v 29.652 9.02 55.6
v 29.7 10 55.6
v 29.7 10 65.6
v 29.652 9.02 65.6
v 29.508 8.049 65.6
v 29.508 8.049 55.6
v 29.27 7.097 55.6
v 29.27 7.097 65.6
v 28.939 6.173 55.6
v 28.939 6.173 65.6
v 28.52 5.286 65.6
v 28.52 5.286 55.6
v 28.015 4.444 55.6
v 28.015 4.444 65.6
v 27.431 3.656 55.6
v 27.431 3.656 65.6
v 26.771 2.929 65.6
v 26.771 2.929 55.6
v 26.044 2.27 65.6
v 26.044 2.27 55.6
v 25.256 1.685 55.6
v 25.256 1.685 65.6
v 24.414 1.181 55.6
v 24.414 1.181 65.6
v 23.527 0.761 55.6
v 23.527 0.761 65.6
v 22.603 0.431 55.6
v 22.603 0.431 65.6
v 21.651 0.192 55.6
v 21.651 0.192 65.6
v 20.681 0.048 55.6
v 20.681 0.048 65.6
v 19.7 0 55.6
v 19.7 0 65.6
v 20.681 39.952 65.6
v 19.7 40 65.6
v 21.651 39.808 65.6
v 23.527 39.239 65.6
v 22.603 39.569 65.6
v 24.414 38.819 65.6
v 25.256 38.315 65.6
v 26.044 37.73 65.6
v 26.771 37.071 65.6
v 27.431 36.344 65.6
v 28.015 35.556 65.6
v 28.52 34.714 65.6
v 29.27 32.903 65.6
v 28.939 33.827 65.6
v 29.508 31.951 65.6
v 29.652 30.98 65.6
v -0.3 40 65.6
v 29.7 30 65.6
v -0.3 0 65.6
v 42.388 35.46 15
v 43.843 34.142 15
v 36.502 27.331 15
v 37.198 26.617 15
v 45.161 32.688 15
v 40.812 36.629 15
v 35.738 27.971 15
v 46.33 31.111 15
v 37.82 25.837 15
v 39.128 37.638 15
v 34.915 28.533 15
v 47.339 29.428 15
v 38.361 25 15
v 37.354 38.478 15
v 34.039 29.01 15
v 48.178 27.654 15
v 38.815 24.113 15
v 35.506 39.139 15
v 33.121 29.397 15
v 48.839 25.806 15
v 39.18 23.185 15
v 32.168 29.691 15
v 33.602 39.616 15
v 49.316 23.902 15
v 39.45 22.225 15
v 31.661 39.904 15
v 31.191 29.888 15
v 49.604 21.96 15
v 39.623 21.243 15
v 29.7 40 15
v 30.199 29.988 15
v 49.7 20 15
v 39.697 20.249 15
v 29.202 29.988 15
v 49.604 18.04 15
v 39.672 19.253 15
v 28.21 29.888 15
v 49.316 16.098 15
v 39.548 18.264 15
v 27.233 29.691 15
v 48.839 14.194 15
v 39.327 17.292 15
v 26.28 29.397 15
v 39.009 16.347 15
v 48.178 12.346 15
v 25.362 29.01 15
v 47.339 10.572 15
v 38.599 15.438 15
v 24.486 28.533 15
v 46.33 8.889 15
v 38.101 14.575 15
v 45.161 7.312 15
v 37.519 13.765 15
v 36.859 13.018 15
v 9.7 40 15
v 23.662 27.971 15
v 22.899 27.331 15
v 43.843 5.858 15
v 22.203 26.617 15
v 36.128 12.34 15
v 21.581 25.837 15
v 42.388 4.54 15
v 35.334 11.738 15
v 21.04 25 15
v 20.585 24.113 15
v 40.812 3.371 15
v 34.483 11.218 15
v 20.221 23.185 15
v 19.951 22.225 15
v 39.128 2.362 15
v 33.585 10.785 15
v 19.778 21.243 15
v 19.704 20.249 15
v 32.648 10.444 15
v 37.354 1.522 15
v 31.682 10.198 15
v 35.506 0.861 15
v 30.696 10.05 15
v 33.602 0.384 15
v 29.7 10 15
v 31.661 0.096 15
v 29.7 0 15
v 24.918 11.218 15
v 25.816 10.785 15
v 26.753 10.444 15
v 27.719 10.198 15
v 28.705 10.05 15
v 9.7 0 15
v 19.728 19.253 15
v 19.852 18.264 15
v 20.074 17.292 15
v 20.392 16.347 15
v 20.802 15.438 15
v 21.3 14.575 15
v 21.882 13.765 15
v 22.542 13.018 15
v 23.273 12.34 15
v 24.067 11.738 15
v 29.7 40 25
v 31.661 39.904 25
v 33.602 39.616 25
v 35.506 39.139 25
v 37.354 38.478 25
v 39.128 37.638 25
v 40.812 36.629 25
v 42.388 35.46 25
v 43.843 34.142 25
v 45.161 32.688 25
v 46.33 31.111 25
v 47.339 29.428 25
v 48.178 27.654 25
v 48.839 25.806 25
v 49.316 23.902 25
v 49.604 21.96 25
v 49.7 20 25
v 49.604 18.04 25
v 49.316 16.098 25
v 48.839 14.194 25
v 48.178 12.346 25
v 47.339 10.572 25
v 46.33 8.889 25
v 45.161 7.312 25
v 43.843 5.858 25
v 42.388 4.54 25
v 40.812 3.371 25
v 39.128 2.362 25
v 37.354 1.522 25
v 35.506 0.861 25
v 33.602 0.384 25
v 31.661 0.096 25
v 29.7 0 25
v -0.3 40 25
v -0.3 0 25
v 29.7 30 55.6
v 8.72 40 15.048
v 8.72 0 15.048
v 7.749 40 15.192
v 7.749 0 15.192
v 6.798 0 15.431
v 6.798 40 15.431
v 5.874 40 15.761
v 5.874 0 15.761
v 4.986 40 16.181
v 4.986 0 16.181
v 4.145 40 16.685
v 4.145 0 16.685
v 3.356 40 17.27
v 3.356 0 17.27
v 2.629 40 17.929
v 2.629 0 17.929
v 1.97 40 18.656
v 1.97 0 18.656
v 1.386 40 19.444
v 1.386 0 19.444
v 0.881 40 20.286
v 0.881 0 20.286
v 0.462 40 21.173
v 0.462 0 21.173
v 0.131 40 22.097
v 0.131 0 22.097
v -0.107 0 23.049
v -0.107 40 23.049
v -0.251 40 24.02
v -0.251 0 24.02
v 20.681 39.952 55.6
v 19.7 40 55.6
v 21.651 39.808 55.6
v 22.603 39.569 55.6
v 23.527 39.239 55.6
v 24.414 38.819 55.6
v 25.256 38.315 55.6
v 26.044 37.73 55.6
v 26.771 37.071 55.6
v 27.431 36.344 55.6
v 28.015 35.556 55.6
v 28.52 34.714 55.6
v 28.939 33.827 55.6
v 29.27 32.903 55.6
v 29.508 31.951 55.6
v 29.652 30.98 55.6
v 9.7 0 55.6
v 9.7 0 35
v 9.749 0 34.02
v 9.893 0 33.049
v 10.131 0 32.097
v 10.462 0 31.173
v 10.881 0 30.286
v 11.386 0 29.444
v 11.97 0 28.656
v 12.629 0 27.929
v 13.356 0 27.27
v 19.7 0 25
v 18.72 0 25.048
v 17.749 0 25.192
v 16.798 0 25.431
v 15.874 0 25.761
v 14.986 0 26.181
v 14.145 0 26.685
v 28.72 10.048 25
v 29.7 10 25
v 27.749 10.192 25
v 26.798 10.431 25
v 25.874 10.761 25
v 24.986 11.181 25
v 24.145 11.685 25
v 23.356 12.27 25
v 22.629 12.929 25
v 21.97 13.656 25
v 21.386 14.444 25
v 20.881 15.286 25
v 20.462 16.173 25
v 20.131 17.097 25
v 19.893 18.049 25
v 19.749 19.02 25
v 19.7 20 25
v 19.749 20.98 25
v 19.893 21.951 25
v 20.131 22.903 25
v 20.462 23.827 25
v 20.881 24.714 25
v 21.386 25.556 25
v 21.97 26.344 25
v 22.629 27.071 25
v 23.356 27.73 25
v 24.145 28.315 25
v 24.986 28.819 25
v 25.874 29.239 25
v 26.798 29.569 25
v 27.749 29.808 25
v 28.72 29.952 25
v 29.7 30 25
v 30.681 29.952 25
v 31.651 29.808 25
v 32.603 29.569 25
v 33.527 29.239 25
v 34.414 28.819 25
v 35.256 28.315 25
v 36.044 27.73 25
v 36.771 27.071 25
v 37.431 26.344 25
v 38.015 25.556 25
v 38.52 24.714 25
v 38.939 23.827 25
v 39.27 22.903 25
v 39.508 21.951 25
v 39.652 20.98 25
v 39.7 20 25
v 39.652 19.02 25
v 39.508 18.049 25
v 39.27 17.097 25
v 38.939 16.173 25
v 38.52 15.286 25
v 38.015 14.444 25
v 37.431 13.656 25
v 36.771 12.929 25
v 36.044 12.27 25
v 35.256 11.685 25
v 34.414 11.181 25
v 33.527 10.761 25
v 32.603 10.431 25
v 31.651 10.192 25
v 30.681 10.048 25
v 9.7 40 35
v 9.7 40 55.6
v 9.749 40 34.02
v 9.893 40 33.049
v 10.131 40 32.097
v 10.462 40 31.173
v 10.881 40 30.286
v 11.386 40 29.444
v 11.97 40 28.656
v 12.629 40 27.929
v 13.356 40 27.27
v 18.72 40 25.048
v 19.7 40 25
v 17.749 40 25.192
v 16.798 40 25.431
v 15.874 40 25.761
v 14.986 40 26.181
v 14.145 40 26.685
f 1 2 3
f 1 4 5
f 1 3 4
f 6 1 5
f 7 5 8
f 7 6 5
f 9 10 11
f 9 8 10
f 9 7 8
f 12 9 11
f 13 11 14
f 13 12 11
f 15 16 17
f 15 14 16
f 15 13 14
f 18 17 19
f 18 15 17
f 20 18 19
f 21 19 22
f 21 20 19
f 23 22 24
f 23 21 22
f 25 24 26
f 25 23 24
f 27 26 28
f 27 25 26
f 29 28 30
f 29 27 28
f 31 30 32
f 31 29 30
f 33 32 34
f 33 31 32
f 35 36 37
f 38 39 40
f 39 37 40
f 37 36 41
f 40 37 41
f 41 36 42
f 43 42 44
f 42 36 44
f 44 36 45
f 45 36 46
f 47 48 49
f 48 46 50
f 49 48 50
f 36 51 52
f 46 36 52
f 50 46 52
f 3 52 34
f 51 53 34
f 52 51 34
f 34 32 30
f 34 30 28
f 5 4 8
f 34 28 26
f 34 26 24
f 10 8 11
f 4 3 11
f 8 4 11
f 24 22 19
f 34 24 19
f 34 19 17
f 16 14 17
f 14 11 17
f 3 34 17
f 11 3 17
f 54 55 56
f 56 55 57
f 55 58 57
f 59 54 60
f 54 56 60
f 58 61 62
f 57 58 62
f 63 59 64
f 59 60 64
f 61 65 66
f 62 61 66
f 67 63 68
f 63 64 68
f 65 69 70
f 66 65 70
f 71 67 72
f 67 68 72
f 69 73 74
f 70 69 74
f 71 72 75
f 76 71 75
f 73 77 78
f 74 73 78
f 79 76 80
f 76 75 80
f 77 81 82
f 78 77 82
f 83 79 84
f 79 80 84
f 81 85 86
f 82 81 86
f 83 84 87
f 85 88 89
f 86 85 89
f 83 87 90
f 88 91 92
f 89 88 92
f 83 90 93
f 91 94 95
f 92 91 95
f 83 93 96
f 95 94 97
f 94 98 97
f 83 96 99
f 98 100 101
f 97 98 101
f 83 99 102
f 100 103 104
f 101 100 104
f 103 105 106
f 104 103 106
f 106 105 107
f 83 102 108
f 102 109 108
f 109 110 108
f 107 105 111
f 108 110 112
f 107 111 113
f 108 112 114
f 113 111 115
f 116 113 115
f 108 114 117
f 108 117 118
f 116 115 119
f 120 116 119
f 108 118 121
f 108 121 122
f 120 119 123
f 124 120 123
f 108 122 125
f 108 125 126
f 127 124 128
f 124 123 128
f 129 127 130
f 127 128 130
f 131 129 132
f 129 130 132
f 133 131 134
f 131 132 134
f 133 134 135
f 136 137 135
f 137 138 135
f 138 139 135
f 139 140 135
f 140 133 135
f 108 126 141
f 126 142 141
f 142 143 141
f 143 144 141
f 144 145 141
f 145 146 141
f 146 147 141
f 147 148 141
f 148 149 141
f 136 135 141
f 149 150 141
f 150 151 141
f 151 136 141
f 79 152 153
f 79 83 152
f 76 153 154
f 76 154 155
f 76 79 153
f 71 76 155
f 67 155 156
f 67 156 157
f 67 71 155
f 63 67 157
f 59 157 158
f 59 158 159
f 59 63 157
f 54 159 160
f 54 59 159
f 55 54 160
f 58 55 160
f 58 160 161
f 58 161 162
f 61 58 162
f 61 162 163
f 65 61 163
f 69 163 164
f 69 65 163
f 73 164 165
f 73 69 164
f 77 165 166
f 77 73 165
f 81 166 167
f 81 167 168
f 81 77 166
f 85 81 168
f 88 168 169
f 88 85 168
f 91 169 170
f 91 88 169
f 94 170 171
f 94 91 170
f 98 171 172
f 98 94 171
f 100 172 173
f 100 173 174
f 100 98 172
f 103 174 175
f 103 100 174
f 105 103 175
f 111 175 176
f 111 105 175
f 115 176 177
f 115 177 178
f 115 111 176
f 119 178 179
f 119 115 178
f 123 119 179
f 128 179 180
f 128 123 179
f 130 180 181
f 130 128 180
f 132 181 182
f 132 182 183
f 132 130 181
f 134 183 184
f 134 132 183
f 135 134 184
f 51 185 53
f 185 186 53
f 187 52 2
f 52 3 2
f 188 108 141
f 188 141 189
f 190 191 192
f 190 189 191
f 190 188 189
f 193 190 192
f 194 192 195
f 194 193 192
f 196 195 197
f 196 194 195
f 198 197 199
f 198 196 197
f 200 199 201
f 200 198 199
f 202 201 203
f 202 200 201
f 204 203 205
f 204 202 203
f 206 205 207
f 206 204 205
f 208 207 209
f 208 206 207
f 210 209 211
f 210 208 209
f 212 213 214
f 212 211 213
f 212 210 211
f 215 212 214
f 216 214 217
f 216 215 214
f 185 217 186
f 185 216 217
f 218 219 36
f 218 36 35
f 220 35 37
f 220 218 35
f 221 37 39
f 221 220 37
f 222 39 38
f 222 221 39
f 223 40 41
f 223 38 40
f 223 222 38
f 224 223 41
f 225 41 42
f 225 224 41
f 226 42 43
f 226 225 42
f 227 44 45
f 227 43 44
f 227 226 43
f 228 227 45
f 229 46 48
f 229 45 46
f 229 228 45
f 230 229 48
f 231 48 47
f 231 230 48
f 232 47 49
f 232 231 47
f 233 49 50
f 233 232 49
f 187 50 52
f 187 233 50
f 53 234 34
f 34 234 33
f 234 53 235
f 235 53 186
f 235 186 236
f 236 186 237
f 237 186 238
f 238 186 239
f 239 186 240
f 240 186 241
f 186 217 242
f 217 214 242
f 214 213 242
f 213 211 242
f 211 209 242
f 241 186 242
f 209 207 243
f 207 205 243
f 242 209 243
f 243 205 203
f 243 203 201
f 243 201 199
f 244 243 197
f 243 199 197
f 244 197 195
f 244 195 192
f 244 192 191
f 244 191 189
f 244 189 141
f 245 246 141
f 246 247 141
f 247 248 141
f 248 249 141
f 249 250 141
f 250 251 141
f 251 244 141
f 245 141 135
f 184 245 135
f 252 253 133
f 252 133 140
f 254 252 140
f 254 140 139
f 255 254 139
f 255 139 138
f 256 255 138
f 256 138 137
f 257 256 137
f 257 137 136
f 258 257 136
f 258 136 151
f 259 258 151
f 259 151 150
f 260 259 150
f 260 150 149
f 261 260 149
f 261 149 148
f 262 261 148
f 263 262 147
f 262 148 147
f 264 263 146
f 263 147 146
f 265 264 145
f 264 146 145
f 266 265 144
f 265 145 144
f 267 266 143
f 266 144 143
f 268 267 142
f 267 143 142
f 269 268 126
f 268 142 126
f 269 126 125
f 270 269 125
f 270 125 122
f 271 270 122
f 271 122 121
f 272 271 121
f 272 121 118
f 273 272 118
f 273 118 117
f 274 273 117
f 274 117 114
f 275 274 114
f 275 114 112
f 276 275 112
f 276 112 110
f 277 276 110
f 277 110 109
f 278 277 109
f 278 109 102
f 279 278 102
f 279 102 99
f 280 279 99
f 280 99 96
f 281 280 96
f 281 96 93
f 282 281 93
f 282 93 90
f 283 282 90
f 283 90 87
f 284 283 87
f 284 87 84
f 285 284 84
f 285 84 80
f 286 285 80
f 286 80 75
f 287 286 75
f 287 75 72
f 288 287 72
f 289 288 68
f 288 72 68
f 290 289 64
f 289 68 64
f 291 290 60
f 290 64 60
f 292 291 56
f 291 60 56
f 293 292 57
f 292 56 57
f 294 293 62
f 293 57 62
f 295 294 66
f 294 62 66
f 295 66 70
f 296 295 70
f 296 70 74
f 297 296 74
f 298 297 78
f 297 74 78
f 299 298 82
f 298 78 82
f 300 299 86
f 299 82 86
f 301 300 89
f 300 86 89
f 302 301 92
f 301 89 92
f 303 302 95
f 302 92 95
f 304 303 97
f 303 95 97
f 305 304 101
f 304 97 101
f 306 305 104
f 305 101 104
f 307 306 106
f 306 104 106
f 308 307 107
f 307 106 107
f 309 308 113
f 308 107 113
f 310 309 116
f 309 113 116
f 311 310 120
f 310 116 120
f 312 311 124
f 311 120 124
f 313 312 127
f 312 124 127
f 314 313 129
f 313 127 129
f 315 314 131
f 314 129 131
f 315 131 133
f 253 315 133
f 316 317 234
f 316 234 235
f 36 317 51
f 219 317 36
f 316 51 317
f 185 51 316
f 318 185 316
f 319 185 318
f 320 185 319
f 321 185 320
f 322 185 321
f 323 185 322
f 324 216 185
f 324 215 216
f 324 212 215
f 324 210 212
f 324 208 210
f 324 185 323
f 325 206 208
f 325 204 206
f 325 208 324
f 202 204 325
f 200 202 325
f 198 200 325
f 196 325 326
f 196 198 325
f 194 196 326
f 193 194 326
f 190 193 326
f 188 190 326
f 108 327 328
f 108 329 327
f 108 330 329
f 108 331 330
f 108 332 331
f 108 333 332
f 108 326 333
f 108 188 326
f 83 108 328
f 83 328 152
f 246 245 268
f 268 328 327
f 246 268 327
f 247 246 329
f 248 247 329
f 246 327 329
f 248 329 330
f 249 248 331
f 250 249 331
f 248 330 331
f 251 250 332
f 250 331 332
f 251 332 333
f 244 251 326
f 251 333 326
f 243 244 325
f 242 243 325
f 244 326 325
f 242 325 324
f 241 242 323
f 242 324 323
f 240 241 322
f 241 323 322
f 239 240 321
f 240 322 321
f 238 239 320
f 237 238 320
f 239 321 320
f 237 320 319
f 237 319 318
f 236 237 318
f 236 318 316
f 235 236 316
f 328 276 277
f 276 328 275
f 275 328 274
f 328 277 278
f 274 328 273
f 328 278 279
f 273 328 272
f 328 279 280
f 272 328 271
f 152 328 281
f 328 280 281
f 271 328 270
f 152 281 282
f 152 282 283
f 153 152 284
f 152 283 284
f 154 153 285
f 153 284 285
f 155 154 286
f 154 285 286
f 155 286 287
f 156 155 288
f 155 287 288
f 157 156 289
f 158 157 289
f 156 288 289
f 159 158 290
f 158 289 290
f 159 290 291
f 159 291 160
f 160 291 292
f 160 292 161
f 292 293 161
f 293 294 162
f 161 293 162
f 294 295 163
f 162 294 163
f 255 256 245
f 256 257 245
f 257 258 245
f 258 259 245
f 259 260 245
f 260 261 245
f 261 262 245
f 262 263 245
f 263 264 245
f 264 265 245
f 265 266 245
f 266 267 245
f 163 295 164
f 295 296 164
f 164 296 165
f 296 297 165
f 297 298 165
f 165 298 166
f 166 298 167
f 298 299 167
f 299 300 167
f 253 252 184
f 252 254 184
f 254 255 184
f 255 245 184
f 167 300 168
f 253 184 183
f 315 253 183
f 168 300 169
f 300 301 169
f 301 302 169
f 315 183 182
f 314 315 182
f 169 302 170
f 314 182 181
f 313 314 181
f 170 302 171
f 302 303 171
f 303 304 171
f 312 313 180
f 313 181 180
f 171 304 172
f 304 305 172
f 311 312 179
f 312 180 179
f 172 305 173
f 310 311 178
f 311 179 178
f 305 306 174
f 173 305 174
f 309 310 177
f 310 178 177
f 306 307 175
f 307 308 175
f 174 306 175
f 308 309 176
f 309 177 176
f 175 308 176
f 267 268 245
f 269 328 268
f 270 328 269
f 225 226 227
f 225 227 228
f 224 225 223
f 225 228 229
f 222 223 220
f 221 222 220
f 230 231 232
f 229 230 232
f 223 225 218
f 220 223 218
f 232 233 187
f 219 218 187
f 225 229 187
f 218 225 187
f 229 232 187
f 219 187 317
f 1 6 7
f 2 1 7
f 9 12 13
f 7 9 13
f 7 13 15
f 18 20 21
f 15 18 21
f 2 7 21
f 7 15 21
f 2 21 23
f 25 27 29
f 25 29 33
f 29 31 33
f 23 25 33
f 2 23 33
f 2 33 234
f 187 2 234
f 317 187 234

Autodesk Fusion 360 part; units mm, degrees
sketch "Sketch1" plane through (0, 0, 0) normal (0, 1, 0) x (1, 0, 0)
  line L0 (29.7004, -65.6) -> (29.7004, -55.6)
  line L1 (29.7004, -55.6) -> (9.7004, -55.6)
  line L2 (9.7004, -55.6) -> (9.7004, -25)
  line L3 (9.7004, -25) -> (29.7004, -25)
  line L4 (29.7004, -25) -> (29.7004, -15)
  line L5 (29.7004, -15) -> (-0.2996, -15)
  line L6 (-0.2996, -15) -> (-0.2996, -65.6)
  line L7 (-0.2996, -65.6) -> (29.7004, -65.6)
  dimension "d1" = 10
  dimension "d2" = 10
  dimension "d5" = 10
  dimension "d6" = 30
  dimension "d7" = 50.6
  dimension "d8" = 30
extrude "Extrude1" add sketch "Sketch1" along normal blind 40
sketch "Sketch2" plane through (0, 0, 15) normal (0, 0, -1) x (1, 0, 0)
  line L0 (29.7004, 0) -> (-0.2996, 0)
  line L1 (-0.2996, 0) -> (-0.2996, -40)
  line L2 (-0.2996, -40) -> (29.7004, -40)
  line L3 (29.7004, -40) -> (29.7004, 0)
  circle A0 centre (29.7004, -20) radius 20
  circle A1 centre (29.7004, -20) radius 10
  dimension "d11" = 20
extrude "Extrude2" add sketch "Sketch2" against normal blind 10 contours L3 A0 A1 picked at (46.2992, -20.9488)
extrude "Extrude3" cut sketch "Sketch2" against normal blind 10 contours L3 A1 picked at (26.4507, -19.2583)
fillet "Fillet1" radius 10 1 edges at (-0.2996, 20, 15)
fillet "Fillet2" radius 10 1 edges at (9.7004, 20, 25)
fillet "Fillet3" radius 10 2 edges at (29.7004, 0, 60.6) (29.7004, 40, 60.6)
